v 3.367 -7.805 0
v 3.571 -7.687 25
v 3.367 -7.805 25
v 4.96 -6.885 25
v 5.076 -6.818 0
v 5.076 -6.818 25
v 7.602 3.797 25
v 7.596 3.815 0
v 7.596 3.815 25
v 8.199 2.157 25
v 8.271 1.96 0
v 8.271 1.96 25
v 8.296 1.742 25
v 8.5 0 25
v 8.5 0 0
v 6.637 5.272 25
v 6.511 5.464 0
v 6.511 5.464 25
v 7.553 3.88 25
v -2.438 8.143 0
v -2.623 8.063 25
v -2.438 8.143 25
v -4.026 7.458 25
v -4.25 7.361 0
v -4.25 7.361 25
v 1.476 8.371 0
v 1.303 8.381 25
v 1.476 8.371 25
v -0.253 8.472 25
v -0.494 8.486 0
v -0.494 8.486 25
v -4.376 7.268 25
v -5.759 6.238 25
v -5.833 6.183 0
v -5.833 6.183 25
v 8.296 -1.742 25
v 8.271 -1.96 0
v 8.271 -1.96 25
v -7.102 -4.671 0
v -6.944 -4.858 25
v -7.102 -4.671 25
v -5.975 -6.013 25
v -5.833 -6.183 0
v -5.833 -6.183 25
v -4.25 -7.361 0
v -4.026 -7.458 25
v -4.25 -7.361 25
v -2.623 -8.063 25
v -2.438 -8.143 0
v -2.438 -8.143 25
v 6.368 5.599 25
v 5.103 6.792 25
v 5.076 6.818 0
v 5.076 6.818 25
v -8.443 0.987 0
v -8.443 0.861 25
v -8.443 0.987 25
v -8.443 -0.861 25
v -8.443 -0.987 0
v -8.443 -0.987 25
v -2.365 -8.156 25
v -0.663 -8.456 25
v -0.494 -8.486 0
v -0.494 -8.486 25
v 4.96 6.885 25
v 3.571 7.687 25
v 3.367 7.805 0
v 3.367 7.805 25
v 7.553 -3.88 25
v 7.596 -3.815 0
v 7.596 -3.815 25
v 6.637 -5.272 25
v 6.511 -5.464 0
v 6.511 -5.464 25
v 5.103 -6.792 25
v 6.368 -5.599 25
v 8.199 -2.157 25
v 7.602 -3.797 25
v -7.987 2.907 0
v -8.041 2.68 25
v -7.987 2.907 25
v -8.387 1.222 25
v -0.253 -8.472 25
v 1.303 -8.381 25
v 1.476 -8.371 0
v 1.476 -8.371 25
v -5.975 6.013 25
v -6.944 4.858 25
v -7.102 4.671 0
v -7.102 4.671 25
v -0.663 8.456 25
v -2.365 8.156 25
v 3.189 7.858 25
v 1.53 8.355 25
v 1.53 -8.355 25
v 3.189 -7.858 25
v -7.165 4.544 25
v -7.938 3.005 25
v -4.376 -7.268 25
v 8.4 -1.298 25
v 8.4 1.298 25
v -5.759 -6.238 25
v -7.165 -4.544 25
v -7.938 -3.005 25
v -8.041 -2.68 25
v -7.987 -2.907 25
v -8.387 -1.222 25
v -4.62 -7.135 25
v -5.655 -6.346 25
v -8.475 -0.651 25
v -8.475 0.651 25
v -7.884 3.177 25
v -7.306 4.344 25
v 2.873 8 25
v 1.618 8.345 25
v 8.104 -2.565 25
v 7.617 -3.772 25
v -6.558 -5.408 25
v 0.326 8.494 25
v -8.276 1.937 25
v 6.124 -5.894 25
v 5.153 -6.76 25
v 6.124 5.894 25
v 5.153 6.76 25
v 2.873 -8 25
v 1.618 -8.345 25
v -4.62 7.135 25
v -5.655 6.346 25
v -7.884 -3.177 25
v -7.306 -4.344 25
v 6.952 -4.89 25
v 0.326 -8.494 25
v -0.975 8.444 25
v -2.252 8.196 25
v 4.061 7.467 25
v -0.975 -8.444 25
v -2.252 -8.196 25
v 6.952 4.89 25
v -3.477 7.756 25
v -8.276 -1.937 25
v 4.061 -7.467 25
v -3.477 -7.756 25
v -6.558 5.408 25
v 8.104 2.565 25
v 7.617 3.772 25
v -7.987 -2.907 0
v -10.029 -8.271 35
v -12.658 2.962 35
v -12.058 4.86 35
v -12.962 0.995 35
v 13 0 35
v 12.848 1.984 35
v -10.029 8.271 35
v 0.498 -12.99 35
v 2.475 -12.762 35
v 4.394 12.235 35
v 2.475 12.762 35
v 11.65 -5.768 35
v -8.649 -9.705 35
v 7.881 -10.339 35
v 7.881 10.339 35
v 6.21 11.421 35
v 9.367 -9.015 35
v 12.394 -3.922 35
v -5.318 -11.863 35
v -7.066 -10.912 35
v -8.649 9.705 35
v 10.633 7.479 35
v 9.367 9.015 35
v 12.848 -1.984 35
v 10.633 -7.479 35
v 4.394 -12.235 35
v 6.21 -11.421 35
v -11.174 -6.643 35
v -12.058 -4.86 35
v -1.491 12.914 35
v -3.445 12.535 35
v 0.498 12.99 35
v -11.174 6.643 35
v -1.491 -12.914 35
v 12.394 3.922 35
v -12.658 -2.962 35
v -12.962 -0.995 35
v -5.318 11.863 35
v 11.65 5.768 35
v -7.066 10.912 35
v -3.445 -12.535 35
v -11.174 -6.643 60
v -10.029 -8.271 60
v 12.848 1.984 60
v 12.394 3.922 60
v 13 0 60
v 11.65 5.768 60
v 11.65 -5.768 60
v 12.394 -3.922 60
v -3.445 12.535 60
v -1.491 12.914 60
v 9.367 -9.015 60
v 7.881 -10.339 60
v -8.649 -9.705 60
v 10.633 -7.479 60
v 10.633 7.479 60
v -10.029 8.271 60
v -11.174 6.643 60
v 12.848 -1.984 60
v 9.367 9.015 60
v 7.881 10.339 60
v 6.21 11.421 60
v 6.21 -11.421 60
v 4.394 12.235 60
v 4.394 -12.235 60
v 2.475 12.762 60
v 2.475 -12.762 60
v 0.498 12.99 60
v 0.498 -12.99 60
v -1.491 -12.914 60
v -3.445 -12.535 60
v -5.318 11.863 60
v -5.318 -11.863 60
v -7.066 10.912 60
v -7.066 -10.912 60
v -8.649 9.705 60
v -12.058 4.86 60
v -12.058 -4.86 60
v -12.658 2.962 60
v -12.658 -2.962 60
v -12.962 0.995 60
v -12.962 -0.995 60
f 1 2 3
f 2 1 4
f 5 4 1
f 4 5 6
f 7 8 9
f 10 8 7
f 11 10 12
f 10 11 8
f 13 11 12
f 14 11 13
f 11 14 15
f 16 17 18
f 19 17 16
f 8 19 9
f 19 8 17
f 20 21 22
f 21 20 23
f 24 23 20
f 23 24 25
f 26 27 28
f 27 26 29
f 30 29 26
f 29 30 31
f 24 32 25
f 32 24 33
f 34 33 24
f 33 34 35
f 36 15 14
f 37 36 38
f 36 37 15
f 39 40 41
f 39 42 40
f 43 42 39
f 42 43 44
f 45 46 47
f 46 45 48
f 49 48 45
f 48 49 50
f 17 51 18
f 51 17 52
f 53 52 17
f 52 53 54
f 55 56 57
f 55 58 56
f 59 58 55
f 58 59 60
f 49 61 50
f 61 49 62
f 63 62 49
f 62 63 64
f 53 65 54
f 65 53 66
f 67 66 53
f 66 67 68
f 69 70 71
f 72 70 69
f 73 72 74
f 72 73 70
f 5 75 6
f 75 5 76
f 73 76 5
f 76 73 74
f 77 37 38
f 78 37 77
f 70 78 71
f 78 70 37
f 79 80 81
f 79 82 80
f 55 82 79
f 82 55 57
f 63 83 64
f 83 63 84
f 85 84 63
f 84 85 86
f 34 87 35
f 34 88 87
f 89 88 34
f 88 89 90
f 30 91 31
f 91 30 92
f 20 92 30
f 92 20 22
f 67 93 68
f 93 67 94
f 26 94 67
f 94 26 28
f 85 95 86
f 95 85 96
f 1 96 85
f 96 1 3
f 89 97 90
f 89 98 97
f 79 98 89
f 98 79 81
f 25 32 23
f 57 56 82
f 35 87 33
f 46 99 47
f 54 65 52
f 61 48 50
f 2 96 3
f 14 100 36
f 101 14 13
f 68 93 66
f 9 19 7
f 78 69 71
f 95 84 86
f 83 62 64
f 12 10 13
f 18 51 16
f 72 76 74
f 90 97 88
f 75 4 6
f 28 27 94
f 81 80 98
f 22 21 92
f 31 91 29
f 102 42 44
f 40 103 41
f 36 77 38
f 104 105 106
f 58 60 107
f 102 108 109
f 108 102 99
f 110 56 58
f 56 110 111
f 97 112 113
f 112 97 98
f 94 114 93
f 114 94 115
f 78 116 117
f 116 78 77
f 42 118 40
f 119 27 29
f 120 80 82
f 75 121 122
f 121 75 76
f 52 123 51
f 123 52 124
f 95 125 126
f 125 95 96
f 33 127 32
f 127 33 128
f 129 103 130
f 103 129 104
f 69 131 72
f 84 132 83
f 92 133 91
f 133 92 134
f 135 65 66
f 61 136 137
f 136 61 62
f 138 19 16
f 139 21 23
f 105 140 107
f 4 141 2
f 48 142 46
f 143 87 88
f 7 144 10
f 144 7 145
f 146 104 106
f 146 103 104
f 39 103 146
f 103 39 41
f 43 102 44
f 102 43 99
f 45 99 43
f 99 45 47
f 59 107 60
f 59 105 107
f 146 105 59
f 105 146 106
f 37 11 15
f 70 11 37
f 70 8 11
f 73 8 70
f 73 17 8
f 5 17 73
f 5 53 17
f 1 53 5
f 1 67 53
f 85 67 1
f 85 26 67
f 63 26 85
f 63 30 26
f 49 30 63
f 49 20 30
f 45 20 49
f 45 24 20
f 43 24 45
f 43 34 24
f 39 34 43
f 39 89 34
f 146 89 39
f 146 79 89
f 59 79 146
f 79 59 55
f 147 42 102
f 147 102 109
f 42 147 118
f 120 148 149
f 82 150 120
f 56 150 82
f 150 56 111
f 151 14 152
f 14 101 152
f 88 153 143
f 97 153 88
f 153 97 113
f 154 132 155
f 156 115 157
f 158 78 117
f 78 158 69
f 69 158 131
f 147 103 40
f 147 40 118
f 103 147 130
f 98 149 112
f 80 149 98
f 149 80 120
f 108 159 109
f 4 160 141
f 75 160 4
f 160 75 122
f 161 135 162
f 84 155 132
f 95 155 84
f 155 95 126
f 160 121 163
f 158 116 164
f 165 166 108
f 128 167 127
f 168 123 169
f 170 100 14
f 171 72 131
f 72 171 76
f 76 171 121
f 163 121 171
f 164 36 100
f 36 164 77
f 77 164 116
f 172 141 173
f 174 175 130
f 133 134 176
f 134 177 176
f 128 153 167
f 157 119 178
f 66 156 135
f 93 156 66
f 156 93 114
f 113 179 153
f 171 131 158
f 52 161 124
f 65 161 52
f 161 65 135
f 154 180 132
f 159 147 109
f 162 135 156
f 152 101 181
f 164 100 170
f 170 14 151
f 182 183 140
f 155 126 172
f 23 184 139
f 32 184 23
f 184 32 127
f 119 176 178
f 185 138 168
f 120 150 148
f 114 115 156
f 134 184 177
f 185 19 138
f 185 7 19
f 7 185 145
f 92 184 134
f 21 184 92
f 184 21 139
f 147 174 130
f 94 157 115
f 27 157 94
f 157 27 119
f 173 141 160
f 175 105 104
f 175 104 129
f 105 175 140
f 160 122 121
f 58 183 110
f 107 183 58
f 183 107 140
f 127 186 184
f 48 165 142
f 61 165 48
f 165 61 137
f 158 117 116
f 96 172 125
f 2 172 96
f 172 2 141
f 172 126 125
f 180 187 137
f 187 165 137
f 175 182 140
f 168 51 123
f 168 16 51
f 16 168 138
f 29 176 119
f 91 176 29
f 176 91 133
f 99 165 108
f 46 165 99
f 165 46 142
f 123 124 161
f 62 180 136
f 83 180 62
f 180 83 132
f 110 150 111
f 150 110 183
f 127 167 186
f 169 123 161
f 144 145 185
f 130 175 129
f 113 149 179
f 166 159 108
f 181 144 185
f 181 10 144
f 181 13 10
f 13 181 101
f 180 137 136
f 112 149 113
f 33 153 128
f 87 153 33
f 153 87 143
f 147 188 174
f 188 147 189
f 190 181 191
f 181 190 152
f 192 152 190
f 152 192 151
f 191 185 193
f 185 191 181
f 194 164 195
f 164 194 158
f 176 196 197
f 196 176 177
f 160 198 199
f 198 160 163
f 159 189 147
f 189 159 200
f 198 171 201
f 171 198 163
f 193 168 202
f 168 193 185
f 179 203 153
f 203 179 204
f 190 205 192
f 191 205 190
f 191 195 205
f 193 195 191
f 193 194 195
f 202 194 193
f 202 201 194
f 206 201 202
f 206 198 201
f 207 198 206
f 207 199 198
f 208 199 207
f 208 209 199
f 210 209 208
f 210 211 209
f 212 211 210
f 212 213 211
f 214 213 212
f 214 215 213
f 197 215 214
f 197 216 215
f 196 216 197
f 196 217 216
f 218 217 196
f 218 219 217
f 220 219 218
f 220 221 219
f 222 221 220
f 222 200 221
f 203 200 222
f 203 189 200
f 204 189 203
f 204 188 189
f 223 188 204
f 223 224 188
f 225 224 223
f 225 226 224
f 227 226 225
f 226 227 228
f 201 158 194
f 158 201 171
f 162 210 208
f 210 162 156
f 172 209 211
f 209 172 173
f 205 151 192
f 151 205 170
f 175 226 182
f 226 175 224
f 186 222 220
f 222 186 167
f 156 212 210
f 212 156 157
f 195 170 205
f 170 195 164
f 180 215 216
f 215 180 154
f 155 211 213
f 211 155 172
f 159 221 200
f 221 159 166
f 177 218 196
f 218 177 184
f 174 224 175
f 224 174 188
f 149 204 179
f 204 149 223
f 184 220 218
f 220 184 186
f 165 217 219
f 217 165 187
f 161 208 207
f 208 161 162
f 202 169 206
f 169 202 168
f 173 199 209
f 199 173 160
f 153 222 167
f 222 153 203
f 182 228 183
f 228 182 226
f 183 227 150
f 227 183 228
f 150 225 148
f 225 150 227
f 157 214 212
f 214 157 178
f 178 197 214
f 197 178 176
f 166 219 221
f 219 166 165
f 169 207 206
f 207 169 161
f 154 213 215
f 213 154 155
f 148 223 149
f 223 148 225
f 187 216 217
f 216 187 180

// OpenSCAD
/* [General Settings] */

// Outer diameter of the top bottle, give 2mm tolerance
dia_outer =  26.0;  // .1

// Inner diameter of the bottom bottle, give 2mm tolerance
dia_inner =  17.0;  // .1

/* [Advanced] */

// You need approx 10mm to transition from large to small
transition = 10.0;  // .1

// Height of each side: 25mm keeps the bottles balancing without support
height     = 25.0;  // .1


// MAIN CODE
module main_code() {
    translate([0,0,0])
    cylinder(h=height, d=dia_inner, center=false, $fa=1);

    translate([0,0,height])
    cylinder(h=transition, d1=dia_inner, d2=dia_outer, center=false, $fa=1);

    translate([0,0,transition+height])
    cylinder(h=height, d=dia_outer, center=false, $fa=1);
}
main_code();



// PARAMETRIC SHUNNEL: SHAMPOO FUNNEL
//
// For decanting shampoo from one bottle to another.
//
// Author: RobotAnna
// https://www.printables.com/@RobotAnna
// 
// CC Public Domain
// http://creativecommons.org/publicdomain/zero/1.0/
